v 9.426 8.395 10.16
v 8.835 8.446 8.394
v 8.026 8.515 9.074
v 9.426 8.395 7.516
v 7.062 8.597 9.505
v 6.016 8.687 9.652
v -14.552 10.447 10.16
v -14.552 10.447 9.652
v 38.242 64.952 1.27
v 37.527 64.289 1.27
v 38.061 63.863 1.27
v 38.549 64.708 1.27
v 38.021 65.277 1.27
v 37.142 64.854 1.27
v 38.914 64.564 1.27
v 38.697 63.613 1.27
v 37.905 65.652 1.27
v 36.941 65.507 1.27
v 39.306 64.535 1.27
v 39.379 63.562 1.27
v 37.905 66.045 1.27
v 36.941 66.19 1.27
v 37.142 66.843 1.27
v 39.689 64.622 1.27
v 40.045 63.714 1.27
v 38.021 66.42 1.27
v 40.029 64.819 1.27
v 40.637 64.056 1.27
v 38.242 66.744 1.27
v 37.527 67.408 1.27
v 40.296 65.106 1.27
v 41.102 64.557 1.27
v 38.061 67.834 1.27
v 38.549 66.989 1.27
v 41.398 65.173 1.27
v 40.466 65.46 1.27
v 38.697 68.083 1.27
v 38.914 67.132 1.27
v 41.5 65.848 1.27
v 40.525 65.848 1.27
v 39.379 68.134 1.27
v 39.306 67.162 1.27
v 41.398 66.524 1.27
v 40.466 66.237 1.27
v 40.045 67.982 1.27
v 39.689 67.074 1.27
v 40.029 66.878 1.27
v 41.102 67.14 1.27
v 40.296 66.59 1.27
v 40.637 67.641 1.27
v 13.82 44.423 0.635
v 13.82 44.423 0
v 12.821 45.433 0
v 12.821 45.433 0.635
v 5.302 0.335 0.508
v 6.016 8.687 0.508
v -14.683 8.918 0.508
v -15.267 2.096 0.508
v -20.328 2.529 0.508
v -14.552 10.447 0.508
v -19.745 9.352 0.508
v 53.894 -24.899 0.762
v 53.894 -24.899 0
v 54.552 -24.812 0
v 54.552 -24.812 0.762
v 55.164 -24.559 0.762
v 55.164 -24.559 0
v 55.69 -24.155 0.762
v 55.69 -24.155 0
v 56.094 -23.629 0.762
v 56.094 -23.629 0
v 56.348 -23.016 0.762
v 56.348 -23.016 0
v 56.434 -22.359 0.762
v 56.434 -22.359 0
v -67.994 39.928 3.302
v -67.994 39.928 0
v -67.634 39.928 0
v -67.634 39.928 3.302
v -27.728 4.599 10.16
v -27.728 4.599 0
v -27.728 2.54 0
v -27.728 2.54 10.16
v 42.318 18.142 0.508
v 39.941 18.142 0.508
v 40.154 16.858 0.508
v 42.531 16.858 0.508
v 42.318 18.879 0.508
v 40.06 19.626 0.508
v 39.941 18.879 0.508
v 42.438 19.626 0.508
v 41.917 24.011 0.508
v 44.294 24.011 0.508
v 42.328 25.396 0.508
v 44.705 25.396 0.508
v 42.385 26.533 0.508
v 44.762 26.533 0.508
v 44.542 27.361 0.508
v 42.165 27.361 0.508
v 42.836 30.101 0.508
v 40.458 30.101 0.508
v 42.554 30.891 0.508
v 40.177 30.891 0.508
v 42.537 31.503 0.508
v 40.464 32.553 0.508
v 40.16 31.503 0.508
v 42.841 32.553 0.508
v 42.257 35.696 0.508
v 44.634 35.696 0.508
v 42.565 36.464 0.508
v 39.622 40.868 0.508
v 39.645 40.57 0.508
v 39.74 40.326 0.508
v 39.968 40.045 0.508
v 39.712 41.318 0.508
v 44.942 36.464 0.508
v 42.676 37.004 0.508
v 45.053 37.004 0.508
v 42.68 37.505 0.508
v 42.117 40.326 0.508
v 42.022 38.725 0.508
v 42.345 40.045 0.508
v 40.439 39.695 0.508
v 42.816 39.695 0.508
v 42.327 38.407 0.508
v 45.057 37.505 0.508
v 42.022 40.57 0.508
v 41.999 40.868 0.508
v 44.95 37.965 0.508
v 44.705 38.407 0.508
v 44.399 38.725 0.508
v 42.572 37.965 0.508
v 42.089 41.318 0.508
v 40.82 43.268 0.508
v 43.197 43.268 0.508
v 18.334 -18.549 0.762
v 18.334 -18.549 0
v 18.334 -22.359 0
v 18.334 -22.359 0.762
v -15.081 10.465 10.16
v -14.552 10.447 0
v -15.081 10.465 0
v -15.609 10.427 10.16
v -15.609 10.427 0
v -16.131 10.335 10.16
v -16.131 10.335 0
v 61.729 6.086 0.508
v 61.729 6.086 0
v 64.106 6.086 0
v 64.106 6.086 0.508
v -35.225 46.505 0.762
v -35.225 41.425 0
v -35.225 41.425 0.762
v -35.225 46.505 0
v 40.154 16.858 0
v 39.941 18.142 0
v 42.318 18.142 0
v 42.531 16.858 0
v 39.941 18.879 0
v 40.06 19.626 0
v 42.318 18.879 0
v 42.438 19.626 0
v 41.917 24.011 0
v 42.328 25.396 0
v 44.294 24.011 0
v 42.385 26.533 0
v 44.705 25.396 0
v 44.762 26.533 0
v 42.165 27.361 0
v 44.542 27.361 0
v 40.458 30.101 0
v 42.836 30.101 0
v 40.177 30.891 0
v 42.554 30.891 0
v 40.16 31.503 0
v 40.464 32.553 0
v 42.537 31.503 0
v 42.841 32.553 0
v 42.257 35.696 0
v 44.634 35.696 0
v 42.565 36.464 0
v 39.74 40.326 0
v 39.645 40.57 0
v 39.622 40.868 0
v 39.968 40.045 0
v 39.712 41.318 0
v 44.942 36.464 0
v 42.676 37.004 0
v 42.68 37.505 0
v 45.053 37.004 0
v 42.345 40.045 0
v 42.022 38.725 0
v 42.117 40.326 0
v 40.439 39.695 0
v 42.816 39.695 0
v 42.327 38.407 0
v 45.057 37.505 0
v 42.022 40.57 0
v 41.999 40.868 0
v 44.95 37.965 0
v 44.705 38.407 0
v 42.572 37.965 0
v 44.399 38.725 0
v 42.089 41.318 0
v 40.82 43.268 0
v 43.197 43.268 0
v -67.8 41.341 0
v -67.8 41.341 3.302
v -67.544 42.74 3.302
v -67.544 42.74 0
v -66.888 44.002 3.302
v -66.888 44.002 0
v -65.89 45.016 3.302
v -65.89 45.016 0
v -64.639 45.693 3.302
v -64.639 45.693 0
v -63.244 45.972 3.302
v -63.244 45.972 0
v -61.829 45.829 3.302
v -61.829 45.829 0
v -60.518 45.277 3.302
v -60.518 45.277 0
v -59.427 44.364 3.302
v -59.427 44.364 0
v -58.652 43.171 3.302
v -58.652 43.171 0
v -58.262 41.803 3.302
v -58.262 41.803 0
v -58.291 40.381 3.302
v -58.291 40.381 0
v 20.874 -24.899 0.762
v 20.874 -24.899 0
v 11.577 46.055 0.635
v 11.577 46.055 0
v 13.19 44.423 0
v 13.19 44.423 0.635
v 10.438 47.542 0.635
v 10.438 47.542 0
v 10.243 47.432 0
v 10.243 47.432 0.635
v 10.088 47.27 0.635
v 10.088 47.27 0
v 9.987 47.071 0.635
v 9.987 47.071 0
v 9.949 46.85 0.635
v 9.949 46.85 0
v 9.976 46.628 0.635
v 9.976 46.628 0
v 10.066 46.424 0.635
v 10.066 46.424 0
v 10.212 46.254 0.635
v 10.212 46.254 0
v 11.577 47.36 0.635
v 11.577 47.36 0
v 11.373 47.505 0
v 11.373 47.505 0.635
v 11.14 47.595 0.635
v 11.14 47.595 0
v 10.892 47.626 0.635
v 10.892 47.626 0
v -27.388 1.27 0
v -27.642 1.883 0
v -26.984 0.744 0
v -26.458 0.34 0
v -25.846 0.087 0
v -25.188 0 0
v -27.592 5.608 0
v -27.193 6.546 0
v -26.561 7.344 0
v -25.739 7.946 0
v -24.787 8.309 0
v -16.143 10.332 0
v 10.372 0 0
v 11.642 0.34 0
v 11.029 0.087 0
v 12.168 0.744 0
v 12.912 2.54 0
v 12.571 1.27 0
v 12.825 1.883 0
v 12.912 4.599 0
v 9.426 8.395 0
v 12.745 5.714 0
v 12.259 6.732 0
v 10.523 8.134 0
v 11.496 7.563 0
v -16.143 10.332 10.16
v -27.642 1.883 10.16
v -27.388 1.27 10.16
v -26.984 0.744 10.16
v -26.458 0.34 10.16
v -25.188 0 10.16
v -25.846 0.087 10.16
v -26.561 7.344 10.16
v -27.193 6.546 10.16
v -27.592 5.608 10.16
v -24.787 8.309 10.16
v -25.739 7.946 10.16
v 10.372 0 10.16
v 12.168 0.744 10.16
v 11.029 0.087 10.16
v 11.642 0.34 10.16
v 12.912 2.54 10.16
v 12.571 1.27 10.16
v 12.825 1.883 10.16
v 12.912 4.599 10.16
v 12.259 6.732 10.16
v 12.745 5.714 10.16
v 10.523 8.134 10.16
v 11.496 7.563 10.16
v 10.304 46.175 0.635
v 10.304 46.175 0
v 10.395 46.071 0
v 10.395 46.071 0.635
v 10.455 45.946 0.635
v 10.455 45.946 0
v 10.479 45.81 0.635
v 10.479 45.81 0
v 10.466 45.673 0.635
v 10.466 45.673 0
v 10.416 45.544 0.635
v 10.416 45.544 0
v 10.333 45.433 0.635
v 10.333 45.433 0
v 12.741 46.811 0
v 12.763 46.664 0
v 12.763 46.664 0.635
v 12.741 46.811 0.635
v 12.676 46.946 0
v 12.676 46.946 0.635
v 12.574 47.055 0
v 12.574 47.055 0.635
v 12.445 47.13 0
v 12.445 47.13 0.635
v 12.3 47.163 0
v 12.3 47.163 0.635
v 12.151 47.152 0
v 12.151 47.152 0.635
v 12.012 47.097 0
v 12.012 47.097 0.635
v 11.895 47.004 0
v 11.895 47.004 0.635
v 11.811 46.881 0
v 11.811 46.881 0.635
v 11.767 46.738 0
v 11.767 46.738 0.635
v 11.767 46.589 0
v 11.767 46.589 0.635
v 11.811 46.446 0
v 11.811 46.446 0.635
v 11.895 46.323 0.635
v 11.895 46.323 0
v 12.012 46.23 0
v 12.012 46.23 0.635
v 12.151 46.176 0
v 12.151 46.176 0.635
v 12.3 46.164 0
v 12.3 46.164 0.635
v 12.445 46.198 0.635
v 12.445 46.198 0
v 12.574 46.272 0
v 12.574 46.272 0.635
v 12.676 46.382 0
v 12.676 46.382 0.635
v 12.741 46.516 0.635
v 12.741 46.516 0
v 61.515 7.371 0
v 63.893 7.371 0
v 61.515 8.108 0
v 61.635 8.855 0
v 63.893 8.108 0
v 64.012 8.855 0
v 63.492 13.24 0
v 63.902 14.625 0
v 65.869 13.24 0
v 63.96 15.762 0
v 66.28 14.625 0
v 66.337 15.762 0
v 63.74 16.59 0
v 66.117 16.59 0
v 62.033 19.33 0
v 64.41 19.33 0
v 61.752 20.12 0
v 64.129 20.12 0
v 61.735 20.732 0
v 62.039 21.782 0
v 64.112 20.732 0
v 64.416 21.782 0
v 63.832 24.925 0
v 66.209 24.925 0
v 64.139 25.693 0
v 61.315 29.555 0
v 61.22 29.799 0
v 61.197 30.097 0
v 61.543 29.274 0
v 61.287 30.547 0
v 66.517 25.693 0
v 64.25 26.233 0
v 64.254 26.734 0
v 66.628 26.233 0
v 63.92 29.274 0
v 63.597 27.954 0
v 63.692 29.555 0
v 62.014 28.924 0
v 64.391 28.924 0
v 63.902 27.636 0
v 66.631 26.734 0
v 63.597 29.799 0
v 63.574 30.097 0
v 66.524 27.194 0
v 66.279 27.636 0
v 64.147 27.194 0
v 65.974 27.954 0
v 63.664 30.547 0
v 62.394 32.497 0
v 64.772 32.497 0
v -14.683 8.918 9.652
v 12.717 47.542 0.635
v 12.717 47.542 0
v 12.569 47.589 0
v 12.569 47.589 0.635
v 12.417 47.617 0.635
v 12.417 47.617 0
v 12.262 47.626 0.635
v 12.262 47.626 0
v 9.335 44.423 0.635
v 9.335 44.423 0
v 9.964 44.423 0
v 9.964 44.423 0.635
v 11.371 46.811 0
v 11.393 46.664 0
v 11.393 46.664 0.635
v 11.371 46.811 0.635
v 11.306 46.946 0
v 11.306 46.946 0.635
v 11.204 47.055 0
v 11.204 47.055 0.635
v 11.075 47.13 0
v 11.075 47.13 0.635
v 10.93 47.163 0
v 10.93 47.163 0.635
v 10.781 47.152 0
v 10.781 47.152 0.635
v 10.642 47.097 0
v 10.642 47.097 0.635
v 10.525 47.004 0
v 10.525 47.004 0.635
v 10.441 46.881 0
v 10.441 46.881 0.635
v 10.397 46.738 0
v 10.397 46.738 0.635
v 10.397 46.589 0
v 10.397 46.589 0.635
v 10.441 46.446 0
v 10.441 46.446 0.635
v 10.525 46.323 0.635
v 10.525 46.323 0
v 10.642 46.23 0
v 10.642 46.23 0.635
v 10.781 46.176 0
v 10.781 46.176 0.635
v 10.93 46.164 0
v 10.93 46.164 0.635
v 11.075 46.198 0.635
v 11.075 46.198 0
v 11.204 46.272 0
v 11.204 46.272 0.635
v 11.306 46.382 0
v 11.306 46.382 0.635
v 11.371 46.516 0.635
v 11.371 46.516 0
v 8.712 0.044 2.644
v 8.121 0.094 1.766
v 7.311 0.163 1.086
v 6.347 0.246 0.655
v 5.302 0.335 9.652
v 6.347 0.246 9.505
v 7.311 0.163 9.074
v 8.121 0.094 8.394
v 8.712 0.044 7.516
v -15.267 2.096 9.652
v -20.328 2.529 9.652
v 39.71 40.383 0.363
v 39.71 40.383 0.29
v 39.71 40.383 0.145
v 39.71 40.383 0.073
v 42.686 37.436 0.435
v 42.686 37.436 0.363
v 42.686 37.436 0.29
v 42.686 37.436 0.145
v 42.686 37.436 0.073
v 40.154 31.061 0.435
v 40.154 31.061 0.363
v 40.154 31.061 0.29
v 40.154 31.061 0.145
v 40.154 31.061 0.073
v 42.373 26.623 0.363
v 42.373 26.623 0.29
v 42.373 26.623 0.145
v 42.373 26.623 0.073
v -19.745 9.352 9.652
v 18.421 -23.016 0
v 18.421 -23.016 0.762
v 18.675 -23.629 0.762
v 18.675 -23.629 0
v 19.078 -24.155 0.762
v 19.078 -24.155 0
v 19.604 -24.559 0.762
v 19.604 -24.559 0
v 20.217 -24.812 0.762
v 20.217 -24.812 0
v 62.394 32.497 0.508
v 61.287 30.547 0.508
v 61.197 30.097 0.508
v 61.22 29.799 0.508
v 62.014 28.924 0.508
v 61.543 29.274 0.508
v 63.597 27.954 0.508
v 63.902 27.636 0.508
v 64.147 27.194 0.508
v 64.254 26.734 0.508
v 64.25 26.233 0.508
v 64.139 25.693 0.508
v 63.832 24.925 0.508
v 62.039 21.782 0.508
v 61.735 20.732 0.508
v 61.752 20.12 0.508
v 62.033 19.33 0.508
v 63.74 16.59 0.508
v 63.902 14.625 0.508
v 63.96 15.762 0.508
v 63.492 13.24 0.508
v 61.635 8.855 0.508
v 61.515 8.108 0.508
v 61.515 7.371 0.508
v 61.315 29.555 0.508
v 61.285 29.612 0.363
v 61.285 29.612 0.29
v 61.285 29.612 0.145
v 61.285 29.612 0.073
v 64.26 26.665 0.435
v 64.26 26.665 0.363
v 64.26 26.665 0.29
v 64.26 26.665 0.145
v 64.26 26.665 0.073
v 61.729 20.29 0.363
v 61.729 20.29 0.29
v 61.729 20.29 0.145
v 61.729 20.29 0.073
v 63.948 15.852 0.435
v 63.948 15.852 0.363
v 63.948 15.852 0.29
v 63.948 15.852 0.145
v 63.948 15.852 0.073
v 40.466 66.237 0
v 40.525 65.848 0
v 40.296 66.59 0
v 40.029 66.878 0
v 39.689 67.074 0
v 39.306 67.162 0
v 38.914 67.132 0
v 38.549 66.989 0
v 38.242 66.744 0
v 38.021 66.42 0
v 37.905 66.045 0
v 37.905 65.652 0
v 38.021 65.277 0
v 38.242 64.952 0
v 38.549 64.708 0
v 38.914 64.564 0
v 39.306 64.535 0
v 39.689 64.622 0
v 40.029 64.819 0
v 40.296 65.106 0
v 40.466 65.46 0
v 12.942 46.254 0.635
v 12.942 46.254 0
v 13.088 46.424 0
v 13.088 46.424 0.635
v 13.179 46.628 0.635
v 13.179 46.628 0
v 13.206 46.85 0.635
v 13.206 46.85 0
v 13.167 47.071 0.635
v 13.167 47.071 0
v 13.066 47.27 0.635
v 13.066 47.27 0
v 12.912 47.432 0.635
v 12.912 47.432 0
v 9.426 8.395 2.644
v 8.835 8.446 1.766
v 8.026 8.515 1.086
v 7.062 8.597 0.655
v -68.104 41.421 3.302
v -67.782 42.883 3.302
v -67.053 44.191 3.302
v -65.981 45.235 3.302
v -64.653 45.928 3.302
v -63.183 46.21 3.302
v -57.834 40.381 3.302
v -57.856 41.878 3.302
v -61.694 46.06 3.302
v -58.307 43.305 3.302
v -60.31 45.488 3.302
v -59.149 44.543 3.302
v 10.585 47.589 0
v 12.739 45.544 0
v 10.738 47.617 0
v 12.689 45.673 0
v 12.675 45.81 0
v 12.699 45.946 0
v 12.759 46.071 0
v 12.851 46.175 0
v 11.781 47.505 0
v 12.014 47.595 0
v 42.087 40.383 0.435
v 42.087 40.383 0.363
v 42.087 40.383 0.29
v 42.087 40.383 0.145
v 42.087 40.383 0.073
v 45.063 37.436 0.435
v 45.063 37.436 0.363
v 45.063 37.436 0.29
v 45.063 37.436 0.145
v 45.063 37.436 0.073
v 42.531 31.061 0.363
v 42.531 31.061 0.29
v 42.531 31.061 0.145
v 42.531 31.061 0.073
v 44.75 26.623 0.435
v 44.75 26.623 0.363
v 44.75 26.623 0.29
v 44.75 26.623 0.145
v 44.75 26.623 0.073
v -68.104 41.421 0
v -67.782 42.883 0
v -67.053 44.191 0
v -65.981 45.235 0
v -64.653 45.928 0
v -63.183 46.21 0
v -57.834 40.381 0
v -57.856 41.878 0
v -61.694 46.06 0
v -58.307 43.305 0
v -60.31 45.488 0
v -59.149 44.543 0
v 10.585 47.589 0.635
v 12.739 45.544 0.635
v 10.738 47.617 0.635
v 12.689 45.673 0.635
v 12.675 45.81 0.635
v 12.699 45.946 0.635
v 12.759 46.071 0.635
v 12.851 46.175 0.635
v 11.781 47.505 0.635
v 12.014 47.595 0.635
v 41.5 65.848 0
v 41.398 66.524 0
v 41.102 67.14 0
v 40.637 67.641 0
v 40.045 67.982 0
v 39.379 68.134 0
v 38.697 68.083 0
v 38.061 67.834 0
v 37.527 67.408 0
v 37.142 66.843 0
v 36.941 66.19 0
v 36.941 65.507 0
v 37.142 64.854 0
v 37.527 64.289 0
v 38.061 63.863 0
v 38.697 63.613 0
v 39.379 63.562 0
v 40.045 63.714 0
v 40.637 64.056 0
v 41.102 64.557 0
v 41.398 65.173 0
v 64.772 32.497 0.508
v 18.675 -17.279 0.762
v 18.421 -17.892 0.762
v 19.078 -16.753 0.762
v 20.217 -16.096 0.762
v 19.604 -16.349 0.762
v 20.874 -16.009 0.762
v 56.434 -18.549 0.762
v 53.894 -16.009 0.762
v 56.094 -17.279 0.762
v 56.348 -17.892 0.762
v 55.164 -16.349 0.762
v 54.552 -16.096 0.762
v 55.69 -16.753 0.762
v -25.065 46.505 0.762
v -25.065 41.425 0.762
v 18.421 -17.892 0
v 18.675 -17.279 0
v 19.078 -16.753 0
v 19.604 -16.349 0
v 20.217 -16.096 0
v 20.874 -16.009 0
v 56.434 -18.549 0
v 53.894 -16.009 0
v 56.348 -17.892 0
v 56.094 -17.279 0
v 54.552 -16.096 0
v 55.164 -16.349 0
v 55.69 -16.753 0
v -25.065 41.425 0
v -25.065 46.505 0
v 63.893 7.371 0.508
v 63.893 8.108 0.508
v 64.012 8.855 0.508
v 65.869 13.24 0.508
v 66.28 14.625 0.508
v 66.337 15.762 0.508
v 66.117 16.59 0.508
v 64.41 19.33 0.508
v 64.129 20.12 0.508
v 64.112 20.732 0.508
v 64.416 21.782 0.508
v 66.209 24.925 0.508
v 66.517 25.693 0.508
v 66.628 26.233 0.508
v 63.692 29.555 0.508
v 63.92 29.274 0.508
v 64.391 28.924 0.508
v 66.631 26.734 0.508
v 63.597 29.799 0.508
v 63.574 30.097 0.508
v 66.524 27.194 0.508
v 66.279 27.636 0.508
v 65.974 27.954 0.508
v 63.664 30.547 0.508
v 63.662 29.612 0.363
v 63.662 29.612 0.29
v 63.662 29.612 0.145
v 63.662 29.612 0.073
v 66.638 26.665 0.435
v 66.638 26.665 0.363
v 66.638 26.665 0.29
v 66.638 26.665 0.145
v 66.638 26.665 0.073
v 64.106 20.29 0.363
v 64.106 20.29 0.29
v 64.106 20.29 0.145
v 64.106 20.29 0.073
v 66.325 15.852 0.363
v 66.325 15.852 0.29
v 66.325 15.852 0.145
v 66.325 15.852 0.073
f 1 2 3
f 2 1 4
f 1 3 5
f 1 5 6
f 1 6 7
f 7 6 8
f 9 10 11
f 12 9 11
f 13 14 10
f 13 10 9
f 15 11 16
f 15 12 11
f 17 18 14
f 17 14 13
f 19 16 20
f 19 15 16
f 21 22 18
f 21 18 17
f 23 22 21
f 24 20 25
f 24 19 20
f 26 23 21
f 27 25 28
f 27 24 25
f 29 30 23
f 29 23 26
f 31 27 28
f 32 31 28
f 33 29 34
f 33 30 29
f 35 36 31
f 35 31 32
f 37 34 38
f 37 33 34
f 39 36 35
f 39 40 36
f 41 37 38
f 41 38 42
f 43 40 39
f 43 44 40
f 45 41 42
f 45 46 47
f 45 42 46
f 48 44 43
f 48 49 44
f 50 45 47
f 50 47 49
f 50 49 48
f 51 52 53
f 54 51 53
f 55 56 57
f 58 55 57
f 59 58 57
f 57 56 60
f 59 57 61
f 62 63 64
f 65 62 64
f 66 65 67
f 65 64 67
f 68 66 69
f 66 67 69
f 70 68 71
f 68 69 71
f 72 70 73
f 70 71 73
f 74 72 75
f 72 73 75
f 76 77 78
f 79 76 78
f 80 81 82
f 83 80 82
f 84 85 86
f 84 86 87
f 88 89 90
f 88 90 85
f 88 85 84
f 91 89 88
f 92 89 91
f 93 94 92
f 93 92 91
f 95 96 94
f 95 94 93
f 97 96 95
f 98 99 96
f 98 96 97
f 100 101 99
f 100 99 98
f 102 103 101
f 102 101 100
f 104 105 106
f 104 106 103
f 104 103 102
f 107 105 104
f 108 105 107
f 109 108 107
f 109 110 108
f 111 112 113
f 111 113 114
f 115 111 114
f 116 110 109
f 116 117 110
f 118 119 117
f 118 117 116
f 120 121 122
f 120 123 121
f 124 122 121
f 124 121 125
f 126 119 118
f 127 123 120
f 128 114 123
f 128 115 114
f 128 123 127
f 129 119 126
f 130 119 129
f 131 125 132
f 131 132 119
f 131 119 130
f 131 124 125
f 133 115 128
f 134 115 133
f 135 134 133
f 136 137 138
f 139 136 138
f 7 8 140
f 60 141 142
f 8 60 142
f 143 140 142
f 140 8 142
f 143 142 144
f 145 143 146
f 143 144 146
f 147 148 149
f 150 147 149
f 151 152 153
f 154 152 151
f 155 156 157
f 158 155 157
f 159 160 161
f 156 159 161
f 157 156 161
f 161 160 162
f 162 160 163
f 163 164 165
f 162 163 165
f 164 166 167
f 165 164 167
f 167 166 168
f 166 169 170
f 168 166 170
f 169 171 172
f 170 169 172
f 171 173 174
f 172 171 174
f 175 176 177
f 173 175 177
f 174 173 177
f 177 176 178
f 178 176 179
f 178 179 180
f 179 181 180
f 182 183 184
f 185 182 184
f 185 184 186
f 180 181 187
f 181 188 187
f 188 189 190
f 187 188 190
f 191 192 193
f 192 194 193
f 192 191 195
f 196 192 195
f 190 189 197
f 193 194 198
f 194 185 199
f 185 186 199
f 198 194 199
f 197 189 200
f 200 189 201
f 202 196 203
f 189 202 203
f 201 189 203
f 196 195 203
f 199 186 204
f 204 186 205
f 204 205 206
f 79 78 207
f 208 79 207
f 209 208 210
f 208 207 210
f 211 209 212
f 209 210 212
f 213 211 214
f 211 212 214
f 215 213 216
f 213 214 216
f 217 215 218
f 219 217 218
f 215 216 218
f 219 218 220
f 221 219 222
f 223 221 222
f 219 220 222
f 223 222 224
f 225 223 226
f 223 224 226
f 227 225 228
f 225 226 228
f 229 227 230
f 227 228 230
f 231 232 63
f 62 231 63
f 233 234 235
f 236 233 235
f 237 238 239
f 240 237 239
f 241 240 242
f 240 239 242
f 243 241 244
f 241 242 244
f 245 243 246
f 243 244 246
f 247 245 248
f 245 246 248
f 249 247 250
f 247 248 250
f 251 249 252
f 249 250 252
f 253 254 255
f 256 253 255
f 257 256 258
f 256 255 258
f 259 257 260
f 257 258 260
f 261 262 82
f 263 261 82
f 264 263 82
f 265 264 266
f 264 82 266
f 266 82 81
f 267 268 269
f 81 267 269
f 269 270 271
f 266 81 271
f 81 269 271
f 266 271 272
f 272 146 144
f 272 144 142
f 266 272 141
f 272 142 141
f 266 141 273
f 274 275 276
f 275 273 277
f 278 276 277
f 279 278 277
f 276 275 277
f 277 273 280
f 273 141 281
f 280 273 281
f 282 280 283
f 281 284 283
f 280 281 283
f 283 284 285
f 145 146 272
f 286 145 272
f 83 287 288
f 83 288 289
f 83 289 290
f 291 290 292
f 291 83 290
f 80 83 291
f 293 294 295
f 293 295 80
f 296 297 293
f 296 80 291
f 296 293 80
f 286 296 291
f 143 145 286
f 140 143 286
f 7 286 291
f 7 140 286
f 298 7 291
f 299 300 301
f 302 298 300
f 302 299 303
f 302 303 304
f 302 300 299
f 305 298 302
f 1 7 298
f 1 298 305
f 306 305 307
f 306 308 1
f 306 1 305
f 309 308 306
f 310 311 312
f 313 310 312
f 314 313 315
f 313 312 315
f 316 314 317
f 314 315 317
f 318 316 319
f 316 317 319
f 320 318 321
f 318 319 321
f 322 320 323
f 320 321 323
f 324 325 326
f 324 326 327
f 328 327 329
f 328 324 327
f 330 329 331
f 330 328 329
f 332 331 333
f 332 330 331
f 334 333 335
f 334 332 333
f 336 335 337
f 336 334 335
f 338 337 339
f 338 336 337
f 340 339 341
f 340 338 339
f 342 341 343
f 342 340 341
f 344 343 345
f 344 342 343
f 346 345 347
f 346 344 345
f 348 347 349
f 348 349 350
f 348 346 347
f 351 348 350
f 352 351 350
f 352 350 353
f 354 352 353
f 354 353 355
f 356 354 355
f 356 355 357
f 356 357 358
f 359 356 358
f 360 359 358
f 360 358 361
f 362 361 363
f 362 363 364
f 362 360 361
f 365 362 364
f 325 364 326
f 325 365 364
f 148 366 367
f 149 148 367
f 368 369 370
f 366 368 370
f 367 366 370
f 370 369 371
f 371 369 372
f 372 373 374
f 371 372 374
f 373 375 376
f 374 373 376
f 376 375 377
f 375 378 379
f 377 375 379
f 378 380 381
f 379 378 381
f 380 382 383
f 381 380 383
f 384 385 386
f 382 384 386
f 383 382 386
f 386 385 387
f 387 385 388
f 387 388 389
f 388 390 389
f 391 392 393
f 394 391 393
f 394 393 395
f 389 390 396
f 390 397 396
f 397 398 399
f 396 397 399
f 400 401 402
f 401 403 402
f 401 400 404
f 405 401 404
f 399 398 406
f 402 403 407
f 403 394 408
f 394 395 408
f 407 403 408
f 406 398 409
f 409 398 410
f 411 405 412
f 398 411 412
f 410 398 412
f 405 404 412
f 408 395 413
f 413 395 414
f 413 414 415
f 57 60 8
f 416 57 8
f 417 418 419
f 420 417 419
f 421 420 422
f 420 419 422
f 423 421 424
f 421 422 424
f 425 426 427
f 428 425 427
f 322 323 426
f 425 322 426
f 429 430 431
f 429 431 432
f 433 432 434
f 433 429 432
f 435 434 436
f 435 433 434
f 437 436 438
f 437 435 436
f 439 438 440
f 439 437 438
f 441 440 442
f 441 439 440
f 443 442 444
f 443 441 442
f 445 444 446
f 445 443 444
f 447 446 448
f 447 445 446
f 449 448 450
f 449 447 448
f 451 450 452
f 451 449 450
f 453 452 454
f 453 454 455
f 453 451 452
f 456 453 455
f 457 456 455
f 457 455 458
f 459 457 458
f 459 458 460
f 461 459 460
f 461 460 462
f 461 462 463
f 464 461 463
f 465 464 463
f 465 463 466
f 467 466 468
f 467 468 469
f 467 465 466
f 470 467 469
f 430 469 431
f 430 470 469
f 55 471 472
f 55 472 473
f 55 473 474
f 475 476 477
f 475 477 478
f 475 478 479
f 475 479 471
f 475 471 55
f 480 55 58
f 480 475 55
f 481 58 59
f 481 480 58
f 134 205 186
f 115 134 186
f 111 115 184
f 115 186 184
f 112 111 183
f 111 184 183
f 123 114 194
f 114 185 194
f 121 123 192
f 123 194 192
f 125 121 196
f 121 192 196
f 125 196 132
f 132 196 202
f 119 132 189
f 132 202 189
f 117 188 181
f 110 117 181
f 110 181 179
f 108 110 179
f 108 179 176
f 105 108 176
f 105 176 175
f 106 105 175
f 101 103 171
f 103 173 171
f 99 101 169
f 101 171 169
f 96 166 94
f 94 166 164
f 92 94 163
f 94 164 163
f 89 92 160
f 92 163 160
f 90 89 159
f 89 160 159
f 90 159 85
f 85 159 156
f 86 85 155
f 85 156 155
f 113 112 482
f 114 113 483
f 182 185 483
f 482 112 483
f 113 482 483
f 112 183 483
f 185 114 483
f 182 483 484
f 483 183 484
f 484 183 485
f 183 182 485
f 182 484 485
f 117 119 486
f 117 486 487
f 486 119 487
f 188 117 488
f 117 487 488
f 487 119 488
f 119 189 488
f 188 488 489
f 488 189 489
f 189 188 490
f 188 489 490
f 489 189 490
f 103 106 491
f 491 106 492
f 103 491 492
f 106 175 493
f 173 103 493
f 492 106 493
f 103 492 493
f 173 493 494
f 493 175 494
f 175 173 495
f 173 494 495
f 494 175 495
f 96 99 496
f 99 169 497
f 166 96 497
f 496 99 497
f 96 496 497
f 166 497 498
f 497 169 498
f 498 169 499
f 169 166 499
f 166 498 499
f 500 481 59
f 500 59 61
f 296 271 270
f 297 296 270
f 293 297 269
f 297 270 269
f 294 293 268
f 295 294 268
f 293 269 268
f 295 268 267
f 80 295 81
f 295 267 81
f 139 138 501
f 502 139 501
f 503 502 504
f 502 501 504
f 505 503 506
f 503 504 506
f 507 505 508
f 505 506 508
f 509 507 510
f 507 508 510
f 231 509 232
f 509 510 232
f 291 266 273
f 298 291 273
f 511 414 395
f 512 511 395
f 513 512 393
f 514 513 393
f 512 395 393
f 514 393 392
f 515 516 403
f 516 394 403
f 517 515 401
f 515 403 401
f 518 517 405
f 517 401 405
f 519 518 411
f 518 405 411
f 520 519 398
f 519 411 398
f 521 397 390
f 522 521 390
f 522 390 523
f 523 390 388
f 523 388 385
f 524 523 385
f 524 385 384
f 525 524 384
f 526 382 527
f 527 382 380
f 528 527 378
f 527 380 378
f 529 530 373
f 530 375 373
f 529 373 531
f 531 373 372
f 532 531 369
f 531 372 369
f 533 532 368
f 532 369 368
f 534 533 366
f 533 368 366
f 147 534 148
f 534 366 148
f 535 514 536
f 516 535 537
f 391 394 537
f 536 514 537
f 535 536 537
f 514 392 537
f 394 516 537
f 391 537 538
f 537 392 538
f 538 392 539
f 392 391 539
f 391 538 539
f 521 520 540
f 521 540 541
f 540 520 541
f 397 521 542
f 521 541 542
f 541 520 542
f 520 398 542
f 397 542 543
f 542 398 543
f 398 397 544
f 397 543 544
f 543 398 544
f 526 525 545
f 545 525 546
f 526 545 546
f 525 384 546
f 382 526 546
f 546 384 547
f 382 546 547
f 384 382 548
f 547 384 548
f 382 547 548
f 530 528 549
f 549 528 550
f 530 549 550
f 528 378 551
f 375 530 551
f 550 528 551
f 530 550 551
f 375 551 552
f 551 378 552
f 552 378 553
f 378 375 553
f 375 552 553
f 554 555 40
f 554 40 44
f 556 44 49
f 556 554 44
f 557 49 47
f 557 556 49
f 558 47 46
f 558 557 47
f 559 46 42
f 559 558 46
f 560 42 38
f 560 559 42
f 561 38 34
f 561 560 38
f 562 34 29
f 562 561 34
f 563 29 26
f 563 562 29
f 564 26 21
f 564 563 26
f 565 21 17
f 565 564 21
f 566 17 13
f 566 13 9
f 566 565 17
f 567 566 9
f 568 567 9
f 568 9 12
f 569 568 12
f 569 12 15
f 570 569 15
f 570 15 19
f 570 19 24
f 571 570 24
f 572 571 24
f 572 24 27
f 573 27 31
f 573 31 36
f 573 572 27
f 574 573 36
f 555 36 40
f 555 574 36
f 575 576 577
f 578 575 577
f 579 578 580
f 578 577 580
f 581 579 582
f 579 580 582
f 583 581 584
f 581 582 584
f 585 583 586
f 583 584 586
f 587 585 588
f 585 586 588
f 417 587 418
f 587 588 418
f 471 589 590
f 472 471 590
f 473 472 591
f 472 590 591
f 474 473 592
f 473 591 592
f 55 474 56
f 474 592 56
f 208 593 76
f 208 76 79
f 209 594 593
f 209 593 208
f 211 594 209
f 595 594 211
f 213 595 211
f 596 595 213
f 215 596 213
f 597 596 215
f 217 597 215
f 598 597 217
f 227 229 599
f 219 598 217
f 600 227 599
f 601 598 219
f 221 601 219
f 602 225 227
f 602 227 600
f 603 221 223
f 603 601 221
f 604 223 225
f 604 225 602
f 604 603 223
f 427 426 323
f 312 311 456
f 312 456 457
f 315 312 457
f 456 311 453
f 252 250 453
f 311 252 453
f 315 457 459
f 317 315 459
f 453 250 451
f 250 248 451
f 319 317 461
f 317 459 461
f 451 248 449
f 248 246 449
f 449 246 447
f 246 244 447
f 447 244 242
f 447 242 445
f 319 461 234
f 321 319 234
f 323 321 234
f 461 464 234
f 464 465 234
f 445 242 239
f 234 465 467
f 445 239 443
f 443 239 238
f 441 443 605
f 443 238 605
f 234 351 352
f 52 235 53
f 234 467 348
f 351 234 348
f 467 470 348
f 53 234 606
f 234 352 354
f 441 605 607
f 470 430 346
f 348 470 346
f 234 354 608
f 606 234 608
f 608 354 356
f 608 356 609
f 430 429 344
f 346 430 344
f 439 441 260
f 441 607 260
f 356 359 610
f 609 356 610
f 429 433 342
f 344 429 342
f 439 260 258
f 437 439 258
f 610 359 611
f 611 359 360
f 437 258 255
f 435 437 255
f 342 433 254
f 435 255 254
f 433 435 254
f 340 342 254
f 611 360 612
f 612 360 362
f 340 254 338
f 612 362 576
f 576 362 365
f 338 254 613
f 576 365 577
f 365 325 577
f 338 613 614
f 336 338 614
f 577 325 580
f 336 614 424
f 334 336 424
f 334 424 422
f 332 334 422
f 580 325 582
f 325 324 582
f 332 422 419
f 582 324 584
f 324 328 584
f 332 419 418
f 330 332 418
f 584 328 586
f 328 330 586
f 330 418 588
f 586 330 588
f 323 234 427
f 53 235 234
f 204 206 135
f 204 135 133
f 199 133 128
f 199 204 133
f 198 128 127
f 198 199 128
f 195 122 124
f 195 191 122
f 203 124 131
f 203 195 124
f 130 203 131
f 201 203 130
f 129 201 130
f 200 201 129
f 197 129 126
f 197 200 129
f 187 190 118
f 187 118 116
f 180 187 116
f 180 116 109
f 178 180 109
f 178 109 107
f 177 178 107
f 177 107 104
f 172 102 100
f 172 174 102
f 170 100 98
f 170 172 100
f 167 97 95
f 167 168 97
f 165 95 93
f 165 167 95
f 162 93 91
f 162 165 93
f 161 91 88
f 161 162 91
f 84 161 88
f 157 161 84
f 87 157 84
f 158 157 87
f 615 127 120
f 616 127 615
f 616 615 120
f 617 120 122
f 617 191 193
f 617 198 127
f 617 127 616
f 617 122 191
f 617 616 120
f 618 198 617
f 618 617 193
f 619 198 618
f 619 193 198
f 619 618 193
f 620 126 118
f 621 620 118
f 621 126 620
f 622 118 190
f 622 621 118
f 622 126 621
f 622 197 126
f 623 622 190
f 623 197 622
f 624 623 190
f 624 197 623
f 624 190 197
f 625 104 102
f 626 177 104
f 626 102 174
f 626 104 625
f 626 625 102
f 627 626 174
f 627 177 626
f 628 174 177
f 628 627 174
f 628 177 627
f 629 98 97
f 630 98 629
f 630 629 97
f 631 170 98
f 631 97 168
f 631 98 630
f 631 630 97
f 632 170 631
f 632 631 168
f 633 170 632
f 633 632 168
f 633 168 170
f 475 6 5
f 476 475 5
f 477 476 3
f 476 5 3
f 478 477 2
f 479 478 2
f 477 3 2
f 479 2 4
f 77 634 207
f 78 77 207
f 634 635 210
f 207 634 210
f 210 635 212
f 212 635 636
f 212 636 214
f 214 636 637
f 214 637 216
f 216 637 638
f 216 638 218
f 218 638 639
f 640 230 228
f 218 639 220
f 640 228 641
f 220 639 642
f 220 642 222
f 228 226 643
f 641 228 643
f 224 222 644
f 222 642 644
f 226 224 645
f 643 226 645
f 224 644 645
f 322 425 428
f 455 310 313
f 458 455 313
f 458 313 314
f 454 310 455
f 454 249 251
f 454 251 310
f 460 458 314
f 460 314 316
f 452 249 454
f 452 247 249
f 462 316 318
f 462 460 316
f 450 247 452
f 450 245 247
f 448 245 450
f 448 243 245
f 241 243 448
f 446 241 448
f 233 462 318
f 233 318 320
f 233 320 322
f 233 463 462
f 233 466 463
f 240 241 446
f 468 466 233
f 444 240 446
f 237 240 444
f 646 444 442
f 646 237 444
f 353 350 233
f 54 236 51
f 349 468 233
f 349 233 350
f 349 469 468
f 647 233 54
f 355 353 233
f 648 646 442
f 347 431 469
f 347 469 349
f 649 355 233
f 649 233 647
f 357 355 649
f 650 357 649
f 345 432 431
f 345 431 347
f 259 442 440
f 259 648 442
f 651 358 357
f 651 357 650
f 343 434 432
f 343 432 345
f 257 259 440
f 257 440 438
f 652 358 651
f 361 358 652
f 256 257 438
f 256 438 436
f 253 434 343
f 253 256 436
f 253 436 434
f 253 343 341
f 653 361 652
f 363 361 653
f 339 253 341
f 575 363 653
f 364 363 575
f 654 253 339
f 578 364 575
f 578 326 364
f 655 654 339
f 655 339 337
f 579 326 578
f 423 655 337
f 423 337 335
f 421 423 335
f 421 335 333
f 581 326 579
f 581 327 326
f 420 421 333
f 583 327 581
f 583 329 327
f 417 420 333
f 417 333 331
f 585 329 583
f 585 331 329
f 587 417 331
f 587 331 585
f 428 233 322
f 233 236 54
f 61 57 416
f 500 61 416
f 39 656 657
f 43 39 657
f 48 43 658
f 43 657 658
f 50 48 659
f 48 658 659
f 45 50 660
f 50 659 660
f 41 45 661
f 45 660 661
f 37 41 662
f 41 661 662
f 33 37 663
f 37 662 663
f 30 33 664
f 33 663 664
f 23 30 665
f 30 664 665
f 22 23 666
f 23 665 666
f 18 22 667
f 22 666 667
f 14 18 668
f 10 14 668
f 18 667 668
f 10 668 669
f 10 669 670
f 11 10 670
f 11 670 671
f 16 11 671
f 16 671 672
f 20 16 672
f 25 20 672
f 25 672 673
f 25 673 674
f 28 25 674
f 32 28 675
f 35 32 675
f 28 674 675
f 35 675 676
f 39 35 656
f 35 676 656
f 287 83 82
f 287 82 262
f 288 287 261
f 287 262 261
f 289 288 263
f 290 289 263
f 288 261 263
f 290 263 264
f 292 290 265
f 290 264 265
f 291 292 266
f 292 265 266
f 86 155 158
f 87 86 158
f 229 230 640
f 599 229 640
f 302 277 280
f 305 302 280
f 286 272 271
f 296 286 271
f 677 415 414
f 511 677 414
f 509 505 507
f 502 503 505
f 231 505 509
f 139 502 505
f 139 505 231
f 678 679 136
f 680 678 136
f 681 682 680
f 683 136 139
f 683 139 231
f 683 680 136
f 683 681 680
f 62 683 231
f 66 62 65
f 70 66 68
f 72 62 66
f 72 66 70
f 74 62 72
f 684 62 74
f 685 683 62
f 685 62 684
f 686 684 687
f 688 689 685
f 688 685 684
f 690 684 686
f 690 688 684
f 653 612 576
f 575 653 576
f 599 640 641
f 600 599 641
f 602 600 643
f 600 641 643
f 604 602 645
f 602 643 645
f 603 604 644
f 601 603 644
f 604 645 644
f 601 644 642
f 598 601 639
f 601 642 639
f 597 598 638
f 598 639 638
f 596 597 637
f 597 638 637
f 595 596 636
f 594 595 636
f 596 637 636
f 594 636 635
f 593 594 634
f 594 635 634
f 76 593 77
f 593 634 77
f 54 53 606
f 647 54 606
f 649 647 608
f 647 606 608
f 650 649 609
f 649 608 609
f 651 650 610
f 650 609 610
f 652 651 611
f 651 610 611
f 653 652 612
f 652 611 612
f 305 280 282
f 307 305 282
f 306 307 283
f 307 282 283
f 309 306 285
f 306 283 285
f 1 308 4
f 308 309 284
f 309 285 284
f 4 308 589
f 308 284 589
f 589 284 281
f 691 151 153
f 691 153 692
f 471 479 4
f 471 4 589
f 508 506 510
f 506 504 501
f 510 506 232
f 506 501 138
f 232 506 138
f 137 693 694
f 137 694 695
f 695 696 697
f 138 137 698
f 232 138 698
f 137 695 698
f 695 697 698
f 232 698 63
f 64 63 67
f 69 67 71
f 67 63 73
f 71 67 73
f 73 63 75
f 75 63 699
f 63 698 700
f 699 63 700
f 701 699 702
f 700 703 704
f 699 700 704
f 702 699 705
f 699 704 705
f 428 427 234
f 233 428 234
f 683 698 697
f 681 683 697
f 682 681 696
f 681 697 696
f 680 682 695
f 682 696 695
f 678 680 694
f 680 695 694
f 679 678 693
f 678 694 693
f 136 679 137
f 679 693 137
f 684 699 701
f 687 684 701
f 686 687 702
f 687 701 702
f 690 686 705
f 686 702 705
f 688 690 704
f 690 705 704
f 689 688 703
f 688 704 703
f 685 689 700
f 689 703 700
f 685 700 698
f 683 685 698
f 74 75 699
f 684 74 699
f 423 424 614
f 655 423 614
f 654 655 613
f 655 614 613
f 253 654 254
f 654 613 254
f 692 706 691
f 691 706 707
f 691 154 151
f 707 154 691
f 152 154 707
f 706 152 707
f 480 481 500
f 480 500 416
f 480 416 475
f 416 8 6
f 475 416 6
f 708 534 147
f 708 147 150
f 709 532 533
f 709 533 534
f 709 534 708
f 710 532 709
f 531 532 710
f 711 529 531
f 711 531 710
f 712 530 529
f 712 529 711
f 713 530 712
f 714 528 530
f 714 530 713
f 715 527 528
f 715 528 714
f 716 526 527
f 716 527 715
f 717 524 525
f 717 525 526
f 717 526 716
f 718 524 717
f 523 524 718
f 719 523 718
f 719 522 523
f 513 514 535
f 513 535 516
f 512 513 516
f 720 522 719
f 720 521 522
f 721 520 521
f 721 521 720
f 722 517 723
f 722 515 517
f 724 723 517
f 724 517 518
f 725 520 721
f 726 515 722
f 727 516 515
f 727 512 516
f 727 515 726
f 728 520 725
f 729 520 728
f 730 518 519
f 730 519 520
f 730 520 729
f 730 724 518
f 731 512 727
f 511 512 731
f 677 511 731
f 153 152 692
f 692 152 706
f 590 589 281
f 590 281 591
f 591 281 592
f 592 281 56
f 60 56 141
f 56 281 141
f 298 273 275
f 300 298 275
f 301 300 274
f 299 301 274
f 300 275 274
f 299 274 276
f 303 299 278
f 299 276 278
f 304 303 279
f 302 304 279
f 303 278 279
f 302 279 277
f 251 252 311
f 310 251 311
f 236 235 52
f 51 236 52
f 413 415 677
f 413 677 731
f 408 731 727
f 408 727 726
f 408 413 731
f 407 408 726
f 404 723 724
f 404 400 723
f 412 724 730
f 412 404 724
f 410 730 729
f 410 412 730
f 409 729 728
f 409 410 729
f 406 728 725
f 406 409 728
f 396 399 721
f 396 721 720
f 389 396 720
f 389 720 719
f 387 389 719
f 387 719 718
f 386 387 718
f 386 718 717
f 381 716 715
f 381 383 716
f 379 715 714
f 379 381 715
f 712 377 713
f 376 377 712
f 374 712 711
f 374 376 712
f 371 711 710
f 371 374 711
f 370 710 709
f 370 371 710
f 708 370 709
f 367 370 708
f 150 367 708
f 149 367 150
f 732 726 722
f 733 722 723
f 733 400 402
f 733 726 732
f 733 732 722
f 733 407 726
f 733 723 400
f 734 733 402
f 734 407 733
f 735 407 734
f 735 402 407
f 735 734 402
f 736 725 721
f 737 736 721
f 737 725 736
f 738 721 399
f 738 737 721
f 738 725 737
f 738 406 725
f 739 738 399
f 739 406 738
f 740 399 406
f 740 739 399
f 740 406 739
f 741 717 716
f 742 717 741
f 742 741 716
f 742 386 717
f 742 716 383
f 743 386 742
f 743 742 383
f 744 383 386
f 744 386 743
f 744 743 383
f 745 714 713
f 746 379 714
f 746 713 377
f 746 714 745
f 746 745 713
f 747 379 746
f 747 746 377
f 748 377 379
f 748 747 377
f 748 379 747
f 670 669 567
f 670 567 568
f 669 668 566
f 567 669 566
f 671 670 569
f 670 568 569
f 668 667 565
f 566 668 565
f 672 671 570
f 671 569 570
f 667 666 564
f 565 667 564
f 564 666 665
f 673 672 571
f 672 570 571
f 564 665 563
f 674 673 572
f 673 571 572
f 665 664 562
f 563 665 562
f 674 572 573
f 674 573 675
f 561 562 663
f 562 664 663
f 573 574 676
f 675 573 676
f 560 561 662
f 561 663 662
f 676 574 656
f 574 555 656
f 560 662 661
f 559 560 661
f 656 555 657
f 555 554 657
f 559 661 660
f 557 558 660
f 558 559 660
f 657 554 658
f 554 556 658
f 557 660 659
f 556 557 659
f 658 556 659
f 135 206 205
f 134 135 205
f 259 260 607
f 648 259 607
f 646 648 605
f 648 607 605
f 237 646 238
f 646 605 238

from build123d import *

# Parameters (mm, degrees)
F1_DEPTH  = 10.16
F3_DEPTH  = 8.382
F4_W      = 6.8476469303
F4_H      = 9.144
F5_DEPTH  = 5.08
F6_R      = 0.5007069219
F7_DEPTH  = 0.635
F9_DEPTH  = 3.302
F11_DEPTH = 0.508
F12_DEPTH = 0.508
F14_DEPTH = 0.762
F15_R     = 2.2924687411
F15_R_2   = 1.3171780173
F16_DEPTH = 1.27
F17_W     = 10.16
F17_H     = 5.08
F18_DEPTH = 0.762


# Not quite as in the source:
# - ends of sketch curves that miss each other by under 0.0002 mm in the source are joined


with BuildPart() as f1:
    # F0 (on Top) → F1 (new body)
    with BuildSketch(Plane.XY):
        with BuildLine():
            ThreePointArc((-24.7868363938, 8.3085960276), (-26.9037898481, 6.9661045557), (-27.7284322733, 4.5988825234))
            Line((-27.7284322733, 4.5988825234), (-27.7284322733, 2.54))
            ThreePointArc((-27.7284322733, 2.54), (-26.9844834975, 0.7439487758), (-25.1884322733, 0))
            Line((-25.1884322733, 0), (10.3715677267, 0))
            ThreePointArc((10.3715677267, 0), (12.1676189509, 0.7439487758), (12.9115677267, 2.54))
            Line((12.9115677267, 2.54), (12.9115677267, 4.5988825234))
            ThreePointArc((12.9115677267, 4.5988825234), (11.9081590401, 7.1755364), (9.4264521363, 8.3950055615))
            Line((9.4264521363, 8.3950055615), (-14.5522111368, 10.4471766271))
            ThreePointArc((-14.5522111368, 10.4471766271), (-15.345923724, 10.4528693603), (-16.1308346038, 10.3348566959))
            Line((-16.1308346038, 10.3348566959), (-16.1432625103, 10.3319639152))
            Line((-16.1432625103, 10.3319639152), (-24.7868363938, 8.3085960276))
        make_face()
    extrude(amount=F1_DEPTH)

    # F2 (on face) → F3 (cut)
    with BuildSketch(Plane(origin=(0.7817892721, 9.1348435917, 0), x_dir=(-0.9963577528, 0.0852714986, 0), z_dir=(0.0852714986, 0.9963577528, 0))):
        with BuildLine():
            Line((15.3900547932, 0.508), (15.3900547932, 9.652))
            Line((15.3900547932, 9.652), (-5.253791913, 9.652))
            ThreePointArc((-5.253791913, 9.652), (-7.2709161912, 9.0742298257), (-8.6762639624, 7.5161520454))
            Line((-8.6762639624, 7.5161520454), (-8.6762639624, 2.6438479546))
            ThreePointArc((-8.6762639624, 2.6438479546), (-7.2709161912, 1.0857701743), (-5.253791913, 0.508))
            Line((-5.253791913, 0.508), (15.3900547932, 0.508))
        make_face()
    extrude(amount=-F3_DEPTH, mode=Mode.SUBTRACT)

    # F4 (on face) → F5 (cut)
    with BuildSketch(Plane(origin=(-15.334000409, 1.3123330354, 0), x_dir=(0.0852714986, 0.9963577528, 0), z_dir=(0.9963577528, -0.0852714986, 0))):
        with Locations((4.2100600409, 5.08)):
            Rectangle(F4_W, F4_H)
    extrude(amount=-F5_DEPTH, mode=Mode.SUBTRACT)


with BuildPart() as f7:
    # F6 (on Top) → F7 (new body)
    with BuildSketch(Plane.XY):
        with BuildLine():
            Line((10.332825936, 45.4332928986), (9.3346098438, 44.4234013557))
            Line((9.3346098438, 44.4234013557), (9.9642197122, 44.4234013557))
            Line((9.9642197122, 44.4234013557), (11.5771517158, 46.0551987213))
            Line((11.5771517158, 46.0551987213), (13.1900837193, 44.4234013557))
            Line((13.1900837193, 44.4234013557), (13.8196935877, 44.4234013557))
            Line((13.8196935877, 44.4234013557), (12.8214774955, 45.4332928986))
            ThreePointArc((12.8214774955, 45.4332928986), (12.6751603345, 45.8103155683), (12.850554154, 46.1747216785))
            Line((12.850554154, 46.1747216785), (12.9423046835, 46.2540345991))
            ThreePointArc((12.9423046835, 46.2540345991), (13.1945501477, 46.9619938139), (12.7166629365, 47.5420436715))
            ThreePointArc((12.7166629365, 47.5420436715), (12.4932857662, 47.6049423658), (12.2621925548, 47.6261445728))
            ThreePointArc((12.2621925548, 47.6261445728), (11.8948137983, 47.5573978913), (11.5771517158, 47.3604612052))
            ThreePointArc((11.5771517158, 47.3604612052), (11.2594896332, 47.5573978913), (10.8921108767, 47.6261445728))
            ThreePointArc((10.8921108767, 47.6261445728), (10.6610176653, 47.6049423658), (10.4376404951, 47.5420436715))
            ThreePointArc((10.4376404951, 47.5420436715), (9.9597532838, 46.9619938139), (10.211998748, 46.2540345991))
            Line((10.211998748, 46.2540345991), (10.3037492775, 46.1747216785))
            ThreePointArc((10.3037492775, 46.1747216785), (10.4791430971, 45.8103155683), (10.332825936, 45.4332928986))
        make_face()
        with Locations((10.8921108767, 46.6637188027)):
            Circle(F6_R, mode=Mode.SUBTRACT)
        with Locations((12.2621925548, 46.6637188027)):
            Circle(F6_R, mode=Mode.SUBTRACT)
    extrude(amount=F7_DEPTH)


with BuildPart() as f9:
    # F8 (on Top) → F9 (new body)
    with BuildSketch(Plane.XY):
        with BuildLine():
            Line((-58.2907013595, 40.3810308359), (-57.8335013595, 40.3810308359))
            ThreePointArc((-57.8335013595, 40.3810308359), (-63.1833058582, 46.2103688914), (-67.9935013595, 39.9283620799))
            Line((-67.9935013595, 39.9283620799), (-67.6338970661, 39.9283620799))
            ThreePointArc((-67.6338970661, 39.9283620799), (-63.2441257914, 45.9716671324), (-58.2907013595, 40.3810308359))
        make_face()
    extrude(amount=F9_DEPTH)


with BuildPart() as f11:
    # F10 (on Top) → F11 (new body)
    with BuildSketch(Plane.XY):
        with BuildLine():
            Line((43.196901679, 43.2678200305), (40.8197306097, 43.2678200305))
            add(Edge.make_bspline(
                [(40.8197306097, 43.2678200305), (40.0903424352, 42.1875066472), (38.6401764766, 40.0396329251), (42.7687162109, 38.9513613115), (42.8981542778, 35.6961252098), (38.3864305973, 30.863637368), (44.2964114797, 26.8628834056), (39.4633863407, 20.0726945137), (39.9567922733, 17.775361978), (40.1539243758, 16.8575011194)],
                knots=[0, 0, 0, 0, 0.1248190868, 0.2481646906, 0.3642220301, 0.5286341512, 0.6867855887, 0.8748604114, 1, 1, 1, 1], degree=3))
            Line((40.1539243758, 16.8575011194), (42.5310954452, 16.8575011194))
            add(Edge.make_bspline(
                [(43.196901679, 43.2678200305), (42.4675135046, 42.1875066472), (41.017347546, 40.0396329251), (45.1458872803, 38.9513613115), (45.2753253472, 35.6961252098), (40.7636016667, 30.863637368), (46.6735825491, 26.8628834056), (41.8405574101, 20.0726945137), (42.3339633426, 17.775361978), (42.5310954452, 16.8575011194)],
                knots=[0, 0, 0, 0, 0.1248190868, 0.2481646906, 0.3642220301, 0.5286341512, 0.6867855887, 0.8748604114, 1, 1, 1, 1], degree=3))
        make_face()
    extrude(amount=F11_DEPTH)

    # F10 (on Top) → F12 (join)
    with BuildSketch(Plane.XY):
        with BuildLine():
            Line((43.196901679, 43.2678200305), (40.8197306097, 43.2678200305))
            add(Edge.make_bspline(
                [(40.8197306097, 43.2678200305), (40.0903424352, 42.1875066472), (38.6401764766, 40.0396329251), (42.7687162109, 38.9513613115), (42.8981542778, 35.6961252098), (38.3864305973, 30.863637368), (44.2964114797, 26.8628834056), (39.4633863407, 20.0726945137), (39.9567922733, 17.775361978), (40.1539243758, 16.8575011194)],
                knots=[0, 0, 0, 0, 0.1248190868, 0.2481646906, 0.3642220301, 0.5286341512, 0.6867855887, 0.8748604114, 1, 1, 1, 1], degree=3))
            Line((40.1539243758, 16.8575011194), (42.5310954452, 16.8575011194))
            add(Edge.make_bspline(
                [(43.196901679, 43.2678200305), (42.4675135046, 42.1875066472), (41.017347546, 40.0396329251), (45.1458872803, 38.9513613115), (45.2753253472, 35.6961252098), (40.7636016667, 30.863637368), (46.6735825491, 26.8628834056), (41.8405574101, 20.0726945137), (42.3339633426, 17.775361978), (42.5310954452, 16.8575011194)],
                knots=[0, 0, 0, 0, 0.1248190868, 0.2481646906, 0.3642220301, 0.5286341512, 0.6867855887, 0.8748604114, 1, 1, 1, 1], degree=3))
        make_face()
    extrude(amount=F12_DEPTH)


with BuildPart() as f12:
    # F10 (on Top) → F12, piece 2 (new body)
    with BuildSketch(Plane.XY):
        with BuildLine():
            Line((64.7716616045, 32.4967515558), (62.3944905351, 32.4967515558))
            add(Edge.make_bspline(
                [(62.3944905351, 32.4967515558), (61.6651023607, 31.4164381725), (60.2149364021, 29.2685644504), (64.3434761363, 28.1802928369), (64.4729142032, 24.9250567351), (59.9611905228, 20.0925688934), (65.8711714052, 16.091814931), (61.0381462662, 9.301626039), (61.5315521987, 7.0042935034), (61.7286843012, 6.0864326447)],
                knots=[0, 0, 0, 0, 0.1248190868, 0.2481646906, 0.3642220301, 0.5286341512, 0.6867855887, 0.8748604114, 1, 1, 1, 1], degree=3))
            Line((61.7286843012, 6.0864326447), (64.1058553706, 6.0864326447))
            add(Edge.make_bspline(
                [(64.7716616045, 32.4967515558), (64.0422734301, 31.4164381725), (62.5921074715, 29.2685644504), (66.7206472057, 28.1802928369), (66.8500852726, 24.9250567351), (62.3383615921, 20.0925688934), (68.2483424746, 16.091814931), (63.4153173355, 9.301626039), (63.9087232681, 7.0042935034), (64.1058553706, 6.0864326447)],
                knots=[0, 0, 0, 0, 0.1248190868, 0.2481646906, 0.3642220301, 0.5286341512, 0.6867855887, 0.8748604114, 1, 1, 1, 1], degree=3))
        make_face()
    extrude(amount=F12_DEPTH)


with BuildPart() as f14:
    # F13 (on Top) → F14 (new body)
    with BuildSketch(Plane.XY):
        with BuildLine():
            Line((53.89424927, -16.0089726677), (20.87424927, -16.0089726677))
            ThreePointArc((20.87424927, -16.0089726677), (19.0781980457, -16.7529214435), (18.33424927, -18.5489726677))
            Line((18.33424927, -18.5489726677), (18.33424927, -22.3589726677))
            ThreePointArc((18.33424927, -22.3589726677), (19.0781980457, -24.1550238919), (20.87424927, -24.8989726677))
            Line((20.87424927, -24.8989726677), (53.89424927, -24.8989726677))
            ThreePointArc((53.89424927, -24.8989726677), (55.6903004942, -24.1550238919), (56.43424927, -22.3589726677))
            Line((56.43424927, -22.3589726677), (56.43424927, -18.5489726677))
            ThreePointArc((56.43424927, -18.5489726677), (55.6903004942, -16.7529214435), (53.89424927, -16.0089726677))
        make_face()
    extrude(amount=F14_DEPTH)


with BuildPart() as f16:
    # F15 (on Top) → F16 (new body)
    with BuildSketch(Plane.XY):
        with Locations((39.2073839903, 65.8483356237)):
            Circle(F15_R)
        with Locations((39.2073839903, 65.8483356237)):
            Circle(F15_R_2, mode=Mode.SUBTRACT)
    extrude(amount=F16_DEPTH)


with BuildPart() as f18:
    # F17 (on Top) → F18 (new body)
    with BuildSketch(Plane.XY):
        with Locations((-30.1450286061, 43.965123704)):
            Rectangle(F17_W, F17_H)
    extrude(amount=F18_DEPTH)


solid = Compound([f1.part, f7.part, f9.part, f11.part, f12.part, f14.part, f16.part, f18.part])
